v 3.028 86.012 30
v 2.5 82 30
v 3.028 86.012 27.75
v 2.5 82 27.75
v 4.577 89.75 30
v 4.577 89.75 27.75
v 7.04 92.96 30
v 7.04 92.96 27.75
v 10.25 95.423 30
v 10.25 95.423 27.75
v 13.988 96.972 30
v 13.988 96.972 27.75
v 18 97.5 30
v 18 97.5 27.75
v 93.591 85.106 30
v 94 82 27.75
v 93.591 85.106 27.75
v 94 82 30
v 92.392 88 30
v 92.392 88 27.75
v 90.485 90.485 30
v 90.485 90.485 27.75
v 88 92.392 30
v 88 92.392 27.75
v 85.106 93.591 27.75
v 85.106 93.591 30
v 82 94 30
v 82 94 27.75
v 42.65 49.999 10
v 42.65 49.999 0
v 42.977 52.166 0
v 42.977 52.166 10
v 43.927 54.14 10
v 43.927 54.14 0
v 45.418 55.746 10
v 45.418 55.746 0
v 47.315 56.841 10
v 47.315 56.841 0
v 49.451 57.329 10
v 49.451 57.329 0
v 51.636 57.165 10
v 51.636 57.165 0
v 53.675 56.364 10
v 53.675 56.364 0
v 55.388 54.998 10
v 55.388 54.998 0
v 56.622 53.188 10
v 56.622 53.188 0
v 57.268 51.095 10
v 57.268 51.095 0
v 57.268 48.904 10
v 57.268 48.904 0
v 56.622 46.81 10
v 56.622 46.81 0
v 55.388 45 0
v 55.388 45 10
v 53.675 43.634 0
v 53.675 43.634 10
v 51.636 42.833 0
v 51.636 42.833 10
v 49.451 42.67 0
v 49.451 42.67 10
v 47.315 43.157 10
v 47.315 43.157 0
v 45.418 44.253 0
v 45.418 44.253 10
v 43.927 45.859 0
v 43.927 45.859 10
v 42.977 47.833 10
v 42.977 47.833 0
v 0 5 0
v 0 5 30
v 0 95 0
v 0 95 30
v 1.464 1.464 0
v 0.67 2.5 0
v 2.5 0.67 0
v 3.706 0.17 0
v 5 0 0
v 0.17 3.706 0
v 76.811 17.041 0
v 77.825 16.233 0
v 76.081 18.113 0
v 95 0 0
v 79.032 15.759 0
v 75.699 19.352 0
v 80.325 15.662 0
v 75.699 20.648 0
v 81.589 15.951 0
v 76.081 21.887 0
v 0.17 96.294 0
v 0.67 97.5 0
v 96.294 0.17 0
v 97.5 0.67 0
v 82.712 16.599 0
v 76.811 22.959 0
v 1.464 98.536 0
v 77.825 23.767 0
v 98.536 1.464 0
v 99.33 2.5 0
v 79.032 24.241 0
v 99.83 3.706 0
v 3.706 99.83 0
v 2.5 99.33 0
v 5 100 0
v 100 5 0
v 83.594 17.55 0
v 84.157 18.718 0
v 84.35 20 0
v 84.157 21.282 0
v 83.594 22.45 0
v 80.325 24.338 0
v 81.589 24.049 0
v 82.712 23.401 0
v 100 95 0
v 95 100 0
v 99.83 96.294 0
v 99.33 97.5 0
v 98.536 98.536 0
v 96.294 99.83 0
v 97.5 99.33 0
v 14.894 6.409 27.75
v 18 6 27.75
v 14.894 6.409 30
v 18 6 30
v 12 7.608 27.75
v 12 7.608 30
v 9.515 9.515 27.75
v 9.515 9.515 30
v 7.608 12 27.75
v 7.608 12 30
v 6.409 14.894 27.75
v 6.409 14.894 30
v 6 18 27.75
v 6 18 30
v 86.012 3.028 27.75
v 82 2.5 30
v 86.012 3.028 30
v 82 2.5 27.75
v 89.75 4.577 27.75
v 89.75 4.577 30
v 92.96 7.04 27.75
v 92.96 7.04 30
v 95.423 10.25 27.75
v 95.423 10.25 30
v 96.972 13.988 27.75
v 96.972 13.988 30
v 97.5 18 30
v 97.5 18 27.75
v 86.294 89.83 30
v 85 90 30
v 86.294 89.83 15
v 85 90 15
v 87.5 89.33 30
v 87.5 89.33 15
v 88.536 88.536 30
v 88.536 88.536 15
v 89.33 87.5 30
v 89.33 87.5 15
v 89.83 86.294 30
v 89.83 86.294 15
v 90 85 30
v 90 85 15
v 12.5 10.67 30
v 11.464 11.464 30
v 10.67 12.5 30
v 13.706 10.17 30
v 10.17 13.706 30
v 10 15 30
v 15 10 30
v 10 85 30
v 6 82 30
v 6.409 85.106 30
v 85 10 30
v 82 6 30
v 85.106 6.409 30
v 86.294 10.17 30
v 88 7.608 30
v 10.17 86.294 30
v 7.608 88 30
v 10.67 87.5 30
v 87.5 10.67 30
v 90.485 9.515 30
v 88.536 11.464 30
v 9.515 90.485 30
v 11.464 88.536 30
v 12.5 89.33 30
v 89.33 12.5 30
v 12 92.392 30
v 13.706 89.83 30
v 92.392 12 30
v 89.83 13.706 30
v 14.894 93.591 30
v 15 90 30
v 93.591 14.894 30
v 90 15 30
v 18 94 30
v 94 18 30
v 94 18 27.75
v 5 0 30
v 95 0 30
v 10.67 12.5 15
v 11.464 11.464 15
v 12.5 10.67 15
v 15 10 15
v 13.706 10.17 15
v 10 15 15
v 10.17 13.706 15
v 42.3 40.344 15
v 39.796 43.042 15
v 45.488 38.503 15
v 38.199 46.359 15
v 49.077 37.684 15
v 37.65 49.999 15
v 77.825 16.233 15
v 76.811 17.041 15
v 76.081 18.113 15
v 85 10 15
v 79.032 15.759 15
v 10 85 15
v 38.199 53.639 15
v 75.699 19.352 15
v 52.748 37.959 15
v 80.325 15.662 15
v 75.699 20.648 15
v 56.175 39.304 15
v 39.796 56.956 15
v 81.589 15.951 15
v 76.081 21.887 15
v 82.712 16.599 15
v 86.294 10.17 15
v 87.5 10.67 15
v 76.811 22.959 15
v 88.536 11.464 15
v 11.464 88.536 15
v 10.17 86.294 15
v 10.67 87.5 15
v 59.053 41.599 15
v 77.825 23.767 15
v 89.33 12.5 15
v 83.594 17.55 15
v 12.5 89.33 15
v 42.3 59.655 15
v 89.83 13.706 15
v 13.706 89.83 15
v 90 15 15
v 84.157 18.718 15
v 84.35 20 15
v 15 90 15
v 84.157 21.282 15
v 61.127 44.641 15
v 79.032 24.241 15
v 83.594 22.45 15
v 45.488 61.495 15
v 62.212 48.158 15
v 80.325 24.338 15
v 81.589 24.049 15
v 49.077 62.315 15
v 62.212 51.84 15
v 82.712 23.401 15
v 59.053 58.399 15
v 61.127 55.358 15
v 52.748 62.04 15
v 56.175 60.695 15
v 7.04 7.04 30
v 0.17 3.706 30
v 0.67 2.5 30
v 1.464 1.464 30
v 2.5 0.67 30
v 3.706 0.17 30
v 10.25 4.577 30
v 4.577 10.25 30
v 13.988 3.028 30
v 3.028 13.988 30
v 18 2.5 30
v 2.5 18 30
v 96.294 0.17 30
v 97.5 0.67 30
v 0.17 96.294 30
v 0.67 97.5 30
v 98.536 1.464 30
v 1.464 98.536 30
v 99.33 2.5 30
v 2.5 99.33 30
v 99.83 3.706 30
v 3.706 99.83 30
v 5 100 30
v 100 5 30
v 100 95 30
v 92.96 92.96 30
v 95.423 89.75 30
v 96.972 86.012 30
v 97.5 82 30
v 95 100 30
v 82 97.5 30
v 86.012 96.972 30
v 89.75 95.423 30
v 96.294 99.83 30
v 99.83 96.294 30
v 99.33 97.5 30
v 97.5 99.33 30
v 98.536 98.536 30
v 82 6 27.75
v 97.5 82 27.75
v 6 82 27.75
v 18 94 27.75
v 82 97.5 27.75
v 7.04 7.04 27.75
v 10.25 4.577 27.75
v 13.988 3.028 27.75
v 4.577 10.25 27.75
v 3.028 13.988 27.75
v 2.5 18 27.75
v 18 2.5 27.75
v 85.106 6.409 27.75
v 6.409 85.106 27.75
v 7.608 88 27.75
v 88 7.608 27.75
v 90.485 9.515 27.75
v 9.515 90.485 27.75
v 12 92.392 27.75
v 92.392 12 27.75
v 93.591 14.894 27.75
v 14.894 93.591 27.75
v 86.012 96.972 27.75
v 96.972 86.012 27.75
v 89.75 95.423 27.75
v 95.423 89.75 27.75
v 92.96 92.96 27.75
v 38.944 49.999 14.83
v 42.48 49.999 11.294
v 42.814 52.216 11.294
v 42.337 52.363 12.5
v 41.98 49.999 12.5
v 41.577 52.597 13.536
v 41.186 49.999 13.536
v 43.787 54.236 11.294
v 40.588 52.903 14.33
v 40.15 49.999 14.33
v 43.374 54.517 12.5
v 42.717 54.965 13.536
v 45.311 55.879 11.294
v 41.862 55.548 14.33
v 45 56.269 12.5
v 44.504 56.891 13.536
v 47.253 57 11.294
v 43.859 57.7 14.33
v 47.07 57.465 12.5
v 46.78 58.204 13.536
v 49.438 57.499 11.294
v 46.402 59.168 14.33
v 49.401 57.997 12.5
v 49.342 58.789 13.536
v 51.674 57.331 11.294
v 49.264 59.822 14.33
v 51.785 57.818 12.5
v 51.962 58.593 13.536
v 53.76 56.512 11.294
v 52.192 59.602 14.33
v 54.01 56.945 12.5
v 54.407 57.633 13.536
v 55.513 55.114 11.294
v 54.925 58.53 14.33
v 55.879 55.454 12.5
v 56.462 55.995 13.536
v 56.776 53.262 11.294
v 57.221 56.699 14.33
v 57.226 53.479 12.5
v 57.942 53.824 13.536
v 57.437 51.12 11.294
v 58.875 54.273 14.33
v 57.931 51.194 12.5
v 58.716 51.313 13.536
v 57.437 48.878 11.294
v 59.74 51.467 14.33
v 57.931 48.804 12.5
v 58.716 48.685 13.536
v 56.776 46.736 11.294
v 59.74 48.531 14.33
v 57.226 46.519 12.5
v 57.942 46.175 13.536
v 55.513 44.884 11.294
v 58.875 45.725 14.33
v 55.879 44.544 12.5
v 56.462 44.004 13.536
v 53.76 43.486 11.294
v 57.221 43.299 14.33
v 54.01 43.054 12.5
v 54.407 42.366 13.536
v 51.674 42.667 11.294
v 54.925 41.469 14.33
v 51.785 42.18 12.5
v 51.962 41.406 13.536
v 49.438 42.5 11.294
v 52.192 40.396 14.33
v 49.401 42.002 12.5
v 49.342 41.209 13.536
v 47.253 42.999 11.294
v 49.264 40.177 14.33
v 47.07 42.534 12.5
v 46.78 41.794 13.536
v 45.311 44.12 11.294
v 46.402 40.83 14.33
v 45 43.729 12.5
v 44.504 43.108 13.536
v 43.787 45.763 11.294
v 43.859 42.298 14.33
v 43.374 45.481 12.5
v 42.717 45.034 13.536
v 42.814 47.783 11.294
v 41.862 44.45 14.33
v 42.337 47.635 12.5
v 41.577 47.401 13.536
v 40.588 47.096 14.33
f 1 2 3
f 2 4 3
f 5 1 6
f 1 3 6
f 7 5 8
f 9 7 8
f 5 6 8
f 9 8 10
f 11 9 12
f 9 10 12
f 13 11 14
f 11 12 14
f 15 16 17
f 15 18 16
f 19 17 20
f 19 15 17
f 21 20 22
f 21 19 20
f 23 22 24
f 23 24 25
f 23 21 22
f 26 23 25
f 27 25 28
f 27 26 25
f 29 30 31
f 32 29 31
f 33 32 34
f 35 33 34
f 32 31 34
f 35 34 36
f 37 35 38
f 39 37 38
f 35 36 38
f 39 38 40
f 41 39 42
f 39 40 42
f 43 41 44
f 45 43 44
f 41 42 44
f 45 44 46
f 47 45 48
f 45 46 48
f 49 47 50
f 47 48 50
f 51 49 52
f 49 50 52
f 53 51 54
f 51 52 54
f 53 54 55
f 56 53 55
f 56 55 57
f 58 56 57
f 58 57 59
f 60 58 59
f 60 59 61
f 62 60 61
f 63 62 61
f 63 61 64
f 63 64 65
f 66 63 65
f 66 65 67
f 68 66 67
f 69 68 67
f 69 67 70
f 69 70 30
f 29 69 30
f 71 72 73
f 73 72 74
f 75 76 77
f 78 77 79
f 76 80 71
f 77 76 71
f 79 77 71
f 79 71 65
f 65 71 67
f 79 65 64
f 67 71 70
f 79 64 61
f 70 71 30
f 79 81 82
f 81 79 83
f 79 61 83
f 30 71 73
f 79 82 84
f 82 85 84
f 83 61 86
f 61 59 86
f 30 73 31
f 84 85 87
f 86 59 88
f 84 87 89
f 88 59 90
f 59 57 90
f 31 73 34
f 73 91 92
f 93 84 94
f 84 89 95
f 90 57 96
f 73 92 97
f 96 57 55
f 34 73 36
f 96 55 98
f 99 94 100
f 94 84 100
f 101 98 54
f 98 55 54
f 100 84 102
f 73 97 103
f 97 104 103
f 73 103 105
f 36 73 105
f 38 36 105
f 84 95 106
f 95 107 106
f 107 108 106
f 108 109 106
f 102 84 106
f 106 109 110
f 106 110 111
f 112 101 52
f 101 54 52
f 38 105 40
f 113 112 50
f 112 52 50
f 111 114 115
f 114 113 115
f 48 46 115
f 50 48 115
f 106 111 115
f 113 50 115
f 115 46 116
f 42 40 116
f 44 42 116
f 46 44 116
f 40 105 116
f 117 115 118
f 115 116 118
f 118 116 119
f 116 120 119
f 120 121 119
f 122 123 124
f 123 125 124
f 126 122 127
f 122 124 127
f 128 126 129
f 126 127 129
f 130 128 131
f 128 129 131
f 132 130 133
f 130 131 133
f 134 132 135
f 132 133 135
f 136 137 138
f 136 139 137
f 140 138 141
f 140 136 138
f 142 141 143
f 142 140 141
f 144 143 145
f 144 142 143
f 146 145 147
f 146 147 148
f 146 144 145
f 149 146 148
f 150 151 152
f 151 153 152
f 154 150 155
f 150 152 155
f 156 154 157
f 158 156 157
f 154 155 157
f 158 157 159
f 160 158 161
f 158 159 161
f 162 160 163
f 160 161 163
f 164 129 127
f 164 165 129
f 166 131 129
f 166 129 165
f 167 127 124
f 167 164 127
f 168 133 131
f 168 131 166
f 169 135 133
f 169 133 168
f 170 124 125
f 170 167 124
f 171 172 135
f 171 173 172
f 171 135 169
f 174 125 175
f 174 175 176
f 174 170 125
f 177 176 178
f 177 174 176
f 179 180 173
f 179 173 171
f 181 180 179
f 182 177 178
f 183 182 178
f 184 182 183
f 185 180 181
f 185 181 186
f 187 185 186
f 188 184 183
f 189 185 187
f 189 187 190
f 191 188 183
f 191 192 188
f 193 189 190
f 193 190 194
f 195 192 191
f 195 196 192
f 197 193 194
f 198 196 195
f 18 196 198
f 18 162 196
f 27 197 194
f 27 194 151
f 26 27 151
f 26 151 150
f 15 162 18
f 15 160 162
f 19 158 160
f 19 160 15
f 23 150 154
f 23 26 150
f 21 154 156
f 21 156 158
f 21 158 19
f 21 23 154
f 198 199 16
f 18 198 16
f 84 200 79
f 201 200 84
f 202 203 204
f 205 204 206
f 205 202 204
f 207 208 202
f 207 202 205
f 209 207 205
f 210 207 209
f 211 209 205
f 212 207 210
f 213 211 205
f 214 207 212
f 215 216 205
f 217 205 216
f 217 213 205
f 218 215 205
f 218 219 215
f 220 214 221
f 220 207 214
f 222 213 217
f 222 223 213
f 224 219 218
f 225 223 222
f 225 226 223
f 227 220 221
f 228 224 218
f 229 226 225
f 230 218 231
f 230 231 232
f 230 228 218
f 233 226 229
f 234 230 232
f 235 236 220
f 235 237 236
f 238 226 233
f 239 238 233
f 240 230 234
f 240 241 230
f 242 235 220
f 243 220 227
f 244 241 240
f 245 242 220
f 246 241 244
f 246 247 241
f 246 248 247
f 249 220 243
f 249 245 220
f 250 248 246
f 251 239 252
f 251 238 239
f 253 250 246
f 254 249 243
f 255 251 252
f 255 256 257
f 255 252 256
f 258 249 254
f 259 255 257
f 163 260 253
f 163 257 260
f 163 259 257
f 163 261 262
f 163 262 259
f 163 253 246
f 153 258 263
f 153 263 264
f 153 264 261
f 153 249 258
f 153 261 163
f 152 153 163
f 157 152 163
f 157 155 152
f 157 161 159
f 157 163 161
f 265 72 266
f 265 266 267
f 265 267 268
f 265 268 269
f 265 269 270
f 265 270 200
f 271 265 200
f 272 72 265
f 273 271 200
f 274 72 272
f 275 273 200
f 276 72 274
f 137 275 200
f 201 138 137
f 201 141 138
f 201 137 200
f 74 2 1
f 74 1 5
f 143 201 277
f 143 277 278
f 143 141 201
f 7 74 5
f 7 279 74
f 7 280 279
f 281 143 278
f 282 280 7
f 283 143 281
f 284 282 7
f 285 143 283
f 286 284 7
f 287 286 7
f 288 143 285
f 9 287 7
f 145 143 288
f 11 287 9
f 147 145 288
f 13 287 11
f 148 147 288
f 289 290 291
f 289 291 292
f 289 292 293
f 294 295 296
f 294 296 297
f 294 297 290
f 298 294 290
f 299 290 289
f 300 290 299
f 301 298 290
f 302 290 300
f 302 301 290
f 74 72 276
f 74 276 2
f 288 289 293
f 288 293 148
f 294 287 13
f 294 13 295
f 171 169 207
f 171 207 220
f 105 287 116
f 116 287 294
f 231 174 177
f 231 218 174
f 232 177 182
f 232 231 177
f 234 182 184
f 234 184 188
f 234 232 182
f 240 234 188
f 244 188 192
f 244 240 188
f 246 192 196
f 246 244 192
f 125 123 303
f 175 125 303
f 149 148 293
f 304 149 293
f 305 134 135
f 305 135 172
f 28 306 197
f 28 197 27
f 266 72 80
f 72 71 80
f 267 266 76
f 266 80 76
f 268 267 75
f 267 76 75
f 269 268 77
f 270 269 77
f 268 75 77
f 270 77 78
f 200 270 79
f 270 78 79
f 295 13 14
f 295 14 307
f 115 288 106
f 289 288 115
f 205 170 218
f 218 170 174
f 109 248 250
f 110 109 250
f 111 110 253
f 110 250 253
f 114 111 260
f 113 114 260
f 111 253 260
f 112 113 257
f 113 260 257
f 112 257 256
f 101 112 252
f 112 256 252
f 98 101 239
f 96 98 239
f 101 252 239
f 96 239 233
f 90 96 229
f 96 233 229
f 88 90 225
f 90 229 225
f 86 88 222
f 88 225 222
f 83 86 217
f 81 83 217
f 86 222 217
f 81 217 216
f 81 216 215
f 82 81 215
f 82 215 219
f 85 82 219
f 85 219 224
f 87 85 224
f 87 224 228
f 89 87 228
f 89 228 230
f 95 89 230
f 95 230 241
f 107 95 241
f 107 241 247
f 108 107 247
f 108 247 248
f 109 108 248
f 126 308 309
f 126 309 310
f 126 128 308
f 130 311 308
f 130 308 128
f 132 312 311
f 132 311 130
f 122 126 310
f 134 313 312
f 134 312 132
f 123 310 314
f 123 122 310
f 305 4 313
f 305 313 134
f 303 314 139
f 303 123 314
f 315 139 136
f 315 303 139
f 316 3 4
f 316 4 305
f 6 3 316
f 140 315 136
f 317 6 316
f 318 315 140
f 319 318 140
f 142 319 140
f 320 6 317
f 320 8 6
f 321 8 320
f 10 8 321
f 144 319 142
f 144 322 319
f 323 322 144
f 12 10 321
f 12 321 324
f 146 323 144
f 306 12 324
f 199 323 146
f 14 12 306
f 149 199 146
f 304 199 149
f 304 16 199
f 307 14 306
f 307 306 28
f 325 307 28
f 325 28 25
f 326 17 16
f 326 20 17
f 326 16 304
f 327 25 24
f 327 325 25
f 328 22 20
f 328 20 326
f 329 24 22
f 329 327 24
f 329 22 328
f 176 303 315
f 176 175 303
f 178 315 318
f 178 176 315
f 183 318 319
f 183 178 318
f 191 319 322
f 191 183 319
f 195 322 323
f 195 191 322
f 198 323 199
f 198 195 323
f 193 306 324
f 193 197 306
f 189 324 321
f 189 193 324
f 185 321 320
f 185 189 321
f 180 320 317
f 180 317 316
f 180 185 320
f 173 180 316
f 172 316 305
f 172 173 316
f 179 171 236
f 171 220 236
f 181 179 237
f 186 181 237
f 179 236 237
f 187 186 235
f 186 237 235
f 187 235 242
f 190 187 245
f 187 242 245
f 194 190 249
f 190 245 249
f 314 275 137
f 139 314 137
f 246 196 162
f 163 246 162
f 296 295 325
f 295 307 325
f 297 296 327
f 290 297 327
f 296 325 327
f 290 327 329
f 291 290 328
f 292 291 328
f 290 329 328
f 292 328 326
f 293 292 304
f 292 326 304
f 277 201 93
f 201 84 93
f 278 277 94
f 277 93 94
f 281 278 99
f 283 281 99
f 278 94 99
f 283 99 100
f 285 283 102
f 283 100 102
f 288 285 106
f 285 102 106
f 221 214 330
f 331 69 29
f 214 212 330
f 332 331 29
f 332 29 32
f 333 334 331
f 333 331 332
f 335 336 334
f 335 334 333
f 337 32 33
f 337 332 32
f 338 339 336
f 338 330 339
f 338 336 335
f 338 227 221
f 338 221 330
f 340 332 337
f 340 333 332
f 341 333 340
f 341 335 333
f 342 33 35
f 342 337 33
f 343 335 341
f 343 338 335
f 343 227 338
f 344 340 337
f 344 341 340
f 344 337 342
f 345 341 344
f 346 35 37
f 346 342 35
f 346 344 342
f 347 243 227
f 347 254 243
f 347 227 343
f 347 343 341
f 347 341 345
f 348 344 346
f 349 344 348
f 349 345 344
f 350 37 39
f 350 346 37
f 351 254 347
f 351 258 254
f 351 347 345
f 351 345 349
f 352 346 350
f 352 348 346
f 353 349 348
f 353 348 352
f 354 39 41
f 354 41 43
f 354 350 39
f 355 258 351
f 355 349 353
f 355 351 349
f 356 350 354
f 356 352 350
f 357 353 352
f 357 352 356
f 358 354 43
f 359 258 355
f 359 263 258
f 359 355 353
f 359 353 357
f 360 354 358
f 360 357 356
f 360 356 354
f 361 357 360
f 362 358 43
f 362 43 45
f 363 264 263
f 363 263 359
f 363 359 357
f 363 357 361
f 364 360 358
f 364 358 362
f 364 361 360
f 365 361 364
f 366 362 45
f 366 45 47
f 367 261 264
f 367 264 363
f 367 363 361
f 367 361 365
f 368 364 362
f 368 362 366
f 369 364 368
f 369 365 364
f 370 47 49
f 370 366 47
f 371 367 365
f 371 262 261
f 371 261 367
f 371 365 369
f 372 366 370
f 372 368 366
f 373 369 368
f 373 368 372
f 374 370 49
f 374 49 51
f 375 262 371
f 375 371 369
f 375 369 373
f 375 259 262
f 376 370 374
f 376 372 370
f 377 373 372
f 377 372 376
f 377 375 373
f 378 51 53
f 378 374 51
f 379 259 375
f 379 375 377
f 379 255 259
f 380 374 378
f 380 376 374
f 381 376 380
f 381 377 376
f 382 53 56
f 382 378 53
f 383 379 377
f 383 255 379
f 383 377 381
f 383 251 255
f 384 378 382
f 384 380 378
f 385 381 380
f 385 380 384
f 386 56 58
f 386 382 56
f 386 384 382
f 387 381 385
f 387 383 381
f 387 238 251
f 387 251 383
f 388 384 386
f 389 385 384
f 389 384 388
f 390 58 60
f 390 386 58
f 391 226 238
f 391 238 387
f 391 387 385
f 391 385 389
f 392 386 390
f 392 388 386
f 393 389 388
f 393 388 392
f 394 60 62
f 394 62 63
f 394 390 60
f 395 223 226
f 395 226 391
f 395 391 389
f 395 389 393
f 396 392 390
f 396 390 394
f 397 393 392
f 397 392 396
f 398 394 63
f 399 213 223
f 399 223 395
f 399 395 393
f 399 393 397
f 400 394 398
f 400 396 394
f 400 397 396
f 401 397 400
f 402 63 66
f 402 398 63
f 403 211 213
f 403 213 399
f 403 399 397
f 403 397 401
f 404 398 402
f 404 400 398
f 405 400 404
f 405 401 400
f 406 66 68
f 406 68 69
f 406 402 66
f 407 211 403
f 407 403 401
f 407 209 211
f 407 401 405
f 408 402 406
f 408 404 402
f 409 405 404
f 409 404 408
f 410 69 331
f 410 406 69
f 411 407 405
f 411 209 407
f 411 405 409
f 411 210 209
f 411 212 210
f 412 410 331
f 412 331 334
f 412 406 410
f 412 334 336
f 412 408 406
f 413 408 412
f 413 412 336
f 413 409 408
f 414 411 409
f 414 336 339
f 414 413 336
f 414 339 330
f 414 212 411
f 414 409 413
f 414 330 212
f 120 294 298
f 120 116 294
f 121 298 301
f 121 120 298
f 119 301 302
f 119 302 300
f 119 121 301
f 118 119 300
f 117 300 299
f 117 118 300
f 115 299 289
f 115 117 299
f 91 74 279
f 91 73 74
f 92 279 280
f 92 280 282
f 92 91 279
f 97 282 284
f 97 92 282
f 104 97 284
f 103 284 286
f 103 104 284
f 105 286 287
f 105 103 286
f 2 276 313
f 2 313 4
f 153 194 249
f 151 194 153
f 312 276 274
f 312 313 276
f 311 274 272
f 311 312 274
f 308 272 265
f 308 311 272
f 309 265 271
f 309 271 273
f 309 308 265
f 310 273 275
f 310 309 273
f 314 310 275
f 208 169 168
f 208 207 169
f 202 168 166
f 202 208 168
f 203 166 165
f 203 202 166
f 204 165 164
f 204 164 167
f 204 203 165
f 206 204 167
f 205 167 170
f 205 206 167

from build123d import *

# Parameters (mm, degrees)
SKETCH1_W                    = 100
SKETCH1_H                    = 100
BOSS_EXTRUDE1_DEPTH          = 30
SKETCH2_W                    = 95
SKETCH2_H                    = 95
CUT_EXTRUDE1_DEPTH           = 2.25
SKETCH3_W                    = 88
SKETCH3_H                    = 88
BOSS_EXTRUDE2_DEPTH          = 2.25
SKETCH4_W                    = 80
SKETCH4_H                    = 80
CUT_EXTRUDE2_DEPTH           = 15
F_9_16_CLEARANCE_HOLE1_D     = 14.7
F_5_16_CLEARANCE_HOLE1_D     = 8.7
F_5_16_CLEARANCE_HOLE1_DEPTH = 30
FILLET1_R                    = 5
FILLET2_R                    = 12
FILLET3_R                    = 15.5


with BuildPart() as part:
    # Sketch1 → Boss-Extrude1 (new body)
    with BuildSketch(Plane.XY.offset(30)):
        with Locations((49.999998297, 50.00000012)):
            Rectangle(SKETCH1_W, SKETCH1_H)
    extrude(amount=-BOSS_EXTRUDE1_DEPTH)

    # Sketch2 → Cut-Extrude1 (cut)
    with BuildSketch(Plane.XY.offset(30)):
        with Locations((49.999998297, 50.00000012)):
            Rectangle(SKETCH2_W, SKETCH2_H)
    extrude(amount=-CUT_EXTRUDE1_DEPTH, mode=Mode.SUBTRACT)

    # Sketch3 → Boss-Extrude2 (add)
    with BuildSketch(Plane.XY.offset(27.75)):
        with Locations((49.999998297, 50.00000012)):
            Rectangle(SKETCH3_W, SKETCH3_H)
    extrude(amount=BOSS_EXTRUDE2_DEPTH)

    # Sketch4 → Cut-Extrude2 (cut)
    with BuildSketch(Plane.XY.offset(30)):
        with Locations((49.999998297, 50.00000012)):
            Rectangle(SKETCH4_W, SKETCH4_H)
    extrude(amount=-CUT_EXTRUDE2_DEPTH, mode=Mode.SUBTRACT)

    # 9/16 Clearance Hole1 (through all)
    with Locations(Plane.XY.offset(15)):
        with Locations((50.000229381, 49.999170193)):
            Hole(F_9_16_CLEARANCE_HOLE1_D / 2)

    # 5/16 Clearance Hole1
    with Locations(Plane(origin=(0, 0, 0), x_dir=(-1, 0, 0), z_dir=(0, 0, -1))):
        with Locations((-79.999998297, 20.00000012)):
            Hole(F_5_16_CLEARANCE_HOLE1_D / 2, depth=F_5_16_CLEARANCE_HOLE1_DEPTH)

    # Fillet1
    fillet1_edges = [part.edges().sort_by_distance(p)[0] for p in [
        (9.999998297, 90.00000012, 22.5),
        (89.999998297, 90.00000012, 22.5),
        (89.999998297, 10.00000012, 22.5),
        (9.999998297, 10.00000012, 22.5),
        (57.350229381, 49.999170193, 15),
        (-1.703e-06, 1.2e-07, 15),
        (-1.703e-06, 100.00000012, 15),
        (99.999998297, 100.00000012, 15),
        (99.999998297, 1.2e-07, 15),
    ]]
    fillet(fillet1_edges, radius=FILLET1_R)

    # Fillet2
    fillet2_edges = [part.edges().sort_by_distance(p)[0] for p in [
        (5.999998297, 6.00000012, 28.875),
        (93.999998297, 6.00000012, 28.875),
        (93.999998297, 94.00000012, 28.875),
        (5.999998297, 94.00000012, 28.875),
    ]]
    fillet(fillet2_edges, radius=FILLET2_R)

    # Fillet3
    fillet3_edges = [part.edges().sort_by_distance(p)[0] for p in [
        (2.499998297, 2.50000012, 28.875),
        (2.499998297, 97.50000012, 28.875),
        (97.499998297, 97.50000012, 28.875),
        (97.499998297, 2.50000012, 28.875),
    ]]
    fillet(fillet3_edges, radius=FILLET3_R)


solid = part.part
